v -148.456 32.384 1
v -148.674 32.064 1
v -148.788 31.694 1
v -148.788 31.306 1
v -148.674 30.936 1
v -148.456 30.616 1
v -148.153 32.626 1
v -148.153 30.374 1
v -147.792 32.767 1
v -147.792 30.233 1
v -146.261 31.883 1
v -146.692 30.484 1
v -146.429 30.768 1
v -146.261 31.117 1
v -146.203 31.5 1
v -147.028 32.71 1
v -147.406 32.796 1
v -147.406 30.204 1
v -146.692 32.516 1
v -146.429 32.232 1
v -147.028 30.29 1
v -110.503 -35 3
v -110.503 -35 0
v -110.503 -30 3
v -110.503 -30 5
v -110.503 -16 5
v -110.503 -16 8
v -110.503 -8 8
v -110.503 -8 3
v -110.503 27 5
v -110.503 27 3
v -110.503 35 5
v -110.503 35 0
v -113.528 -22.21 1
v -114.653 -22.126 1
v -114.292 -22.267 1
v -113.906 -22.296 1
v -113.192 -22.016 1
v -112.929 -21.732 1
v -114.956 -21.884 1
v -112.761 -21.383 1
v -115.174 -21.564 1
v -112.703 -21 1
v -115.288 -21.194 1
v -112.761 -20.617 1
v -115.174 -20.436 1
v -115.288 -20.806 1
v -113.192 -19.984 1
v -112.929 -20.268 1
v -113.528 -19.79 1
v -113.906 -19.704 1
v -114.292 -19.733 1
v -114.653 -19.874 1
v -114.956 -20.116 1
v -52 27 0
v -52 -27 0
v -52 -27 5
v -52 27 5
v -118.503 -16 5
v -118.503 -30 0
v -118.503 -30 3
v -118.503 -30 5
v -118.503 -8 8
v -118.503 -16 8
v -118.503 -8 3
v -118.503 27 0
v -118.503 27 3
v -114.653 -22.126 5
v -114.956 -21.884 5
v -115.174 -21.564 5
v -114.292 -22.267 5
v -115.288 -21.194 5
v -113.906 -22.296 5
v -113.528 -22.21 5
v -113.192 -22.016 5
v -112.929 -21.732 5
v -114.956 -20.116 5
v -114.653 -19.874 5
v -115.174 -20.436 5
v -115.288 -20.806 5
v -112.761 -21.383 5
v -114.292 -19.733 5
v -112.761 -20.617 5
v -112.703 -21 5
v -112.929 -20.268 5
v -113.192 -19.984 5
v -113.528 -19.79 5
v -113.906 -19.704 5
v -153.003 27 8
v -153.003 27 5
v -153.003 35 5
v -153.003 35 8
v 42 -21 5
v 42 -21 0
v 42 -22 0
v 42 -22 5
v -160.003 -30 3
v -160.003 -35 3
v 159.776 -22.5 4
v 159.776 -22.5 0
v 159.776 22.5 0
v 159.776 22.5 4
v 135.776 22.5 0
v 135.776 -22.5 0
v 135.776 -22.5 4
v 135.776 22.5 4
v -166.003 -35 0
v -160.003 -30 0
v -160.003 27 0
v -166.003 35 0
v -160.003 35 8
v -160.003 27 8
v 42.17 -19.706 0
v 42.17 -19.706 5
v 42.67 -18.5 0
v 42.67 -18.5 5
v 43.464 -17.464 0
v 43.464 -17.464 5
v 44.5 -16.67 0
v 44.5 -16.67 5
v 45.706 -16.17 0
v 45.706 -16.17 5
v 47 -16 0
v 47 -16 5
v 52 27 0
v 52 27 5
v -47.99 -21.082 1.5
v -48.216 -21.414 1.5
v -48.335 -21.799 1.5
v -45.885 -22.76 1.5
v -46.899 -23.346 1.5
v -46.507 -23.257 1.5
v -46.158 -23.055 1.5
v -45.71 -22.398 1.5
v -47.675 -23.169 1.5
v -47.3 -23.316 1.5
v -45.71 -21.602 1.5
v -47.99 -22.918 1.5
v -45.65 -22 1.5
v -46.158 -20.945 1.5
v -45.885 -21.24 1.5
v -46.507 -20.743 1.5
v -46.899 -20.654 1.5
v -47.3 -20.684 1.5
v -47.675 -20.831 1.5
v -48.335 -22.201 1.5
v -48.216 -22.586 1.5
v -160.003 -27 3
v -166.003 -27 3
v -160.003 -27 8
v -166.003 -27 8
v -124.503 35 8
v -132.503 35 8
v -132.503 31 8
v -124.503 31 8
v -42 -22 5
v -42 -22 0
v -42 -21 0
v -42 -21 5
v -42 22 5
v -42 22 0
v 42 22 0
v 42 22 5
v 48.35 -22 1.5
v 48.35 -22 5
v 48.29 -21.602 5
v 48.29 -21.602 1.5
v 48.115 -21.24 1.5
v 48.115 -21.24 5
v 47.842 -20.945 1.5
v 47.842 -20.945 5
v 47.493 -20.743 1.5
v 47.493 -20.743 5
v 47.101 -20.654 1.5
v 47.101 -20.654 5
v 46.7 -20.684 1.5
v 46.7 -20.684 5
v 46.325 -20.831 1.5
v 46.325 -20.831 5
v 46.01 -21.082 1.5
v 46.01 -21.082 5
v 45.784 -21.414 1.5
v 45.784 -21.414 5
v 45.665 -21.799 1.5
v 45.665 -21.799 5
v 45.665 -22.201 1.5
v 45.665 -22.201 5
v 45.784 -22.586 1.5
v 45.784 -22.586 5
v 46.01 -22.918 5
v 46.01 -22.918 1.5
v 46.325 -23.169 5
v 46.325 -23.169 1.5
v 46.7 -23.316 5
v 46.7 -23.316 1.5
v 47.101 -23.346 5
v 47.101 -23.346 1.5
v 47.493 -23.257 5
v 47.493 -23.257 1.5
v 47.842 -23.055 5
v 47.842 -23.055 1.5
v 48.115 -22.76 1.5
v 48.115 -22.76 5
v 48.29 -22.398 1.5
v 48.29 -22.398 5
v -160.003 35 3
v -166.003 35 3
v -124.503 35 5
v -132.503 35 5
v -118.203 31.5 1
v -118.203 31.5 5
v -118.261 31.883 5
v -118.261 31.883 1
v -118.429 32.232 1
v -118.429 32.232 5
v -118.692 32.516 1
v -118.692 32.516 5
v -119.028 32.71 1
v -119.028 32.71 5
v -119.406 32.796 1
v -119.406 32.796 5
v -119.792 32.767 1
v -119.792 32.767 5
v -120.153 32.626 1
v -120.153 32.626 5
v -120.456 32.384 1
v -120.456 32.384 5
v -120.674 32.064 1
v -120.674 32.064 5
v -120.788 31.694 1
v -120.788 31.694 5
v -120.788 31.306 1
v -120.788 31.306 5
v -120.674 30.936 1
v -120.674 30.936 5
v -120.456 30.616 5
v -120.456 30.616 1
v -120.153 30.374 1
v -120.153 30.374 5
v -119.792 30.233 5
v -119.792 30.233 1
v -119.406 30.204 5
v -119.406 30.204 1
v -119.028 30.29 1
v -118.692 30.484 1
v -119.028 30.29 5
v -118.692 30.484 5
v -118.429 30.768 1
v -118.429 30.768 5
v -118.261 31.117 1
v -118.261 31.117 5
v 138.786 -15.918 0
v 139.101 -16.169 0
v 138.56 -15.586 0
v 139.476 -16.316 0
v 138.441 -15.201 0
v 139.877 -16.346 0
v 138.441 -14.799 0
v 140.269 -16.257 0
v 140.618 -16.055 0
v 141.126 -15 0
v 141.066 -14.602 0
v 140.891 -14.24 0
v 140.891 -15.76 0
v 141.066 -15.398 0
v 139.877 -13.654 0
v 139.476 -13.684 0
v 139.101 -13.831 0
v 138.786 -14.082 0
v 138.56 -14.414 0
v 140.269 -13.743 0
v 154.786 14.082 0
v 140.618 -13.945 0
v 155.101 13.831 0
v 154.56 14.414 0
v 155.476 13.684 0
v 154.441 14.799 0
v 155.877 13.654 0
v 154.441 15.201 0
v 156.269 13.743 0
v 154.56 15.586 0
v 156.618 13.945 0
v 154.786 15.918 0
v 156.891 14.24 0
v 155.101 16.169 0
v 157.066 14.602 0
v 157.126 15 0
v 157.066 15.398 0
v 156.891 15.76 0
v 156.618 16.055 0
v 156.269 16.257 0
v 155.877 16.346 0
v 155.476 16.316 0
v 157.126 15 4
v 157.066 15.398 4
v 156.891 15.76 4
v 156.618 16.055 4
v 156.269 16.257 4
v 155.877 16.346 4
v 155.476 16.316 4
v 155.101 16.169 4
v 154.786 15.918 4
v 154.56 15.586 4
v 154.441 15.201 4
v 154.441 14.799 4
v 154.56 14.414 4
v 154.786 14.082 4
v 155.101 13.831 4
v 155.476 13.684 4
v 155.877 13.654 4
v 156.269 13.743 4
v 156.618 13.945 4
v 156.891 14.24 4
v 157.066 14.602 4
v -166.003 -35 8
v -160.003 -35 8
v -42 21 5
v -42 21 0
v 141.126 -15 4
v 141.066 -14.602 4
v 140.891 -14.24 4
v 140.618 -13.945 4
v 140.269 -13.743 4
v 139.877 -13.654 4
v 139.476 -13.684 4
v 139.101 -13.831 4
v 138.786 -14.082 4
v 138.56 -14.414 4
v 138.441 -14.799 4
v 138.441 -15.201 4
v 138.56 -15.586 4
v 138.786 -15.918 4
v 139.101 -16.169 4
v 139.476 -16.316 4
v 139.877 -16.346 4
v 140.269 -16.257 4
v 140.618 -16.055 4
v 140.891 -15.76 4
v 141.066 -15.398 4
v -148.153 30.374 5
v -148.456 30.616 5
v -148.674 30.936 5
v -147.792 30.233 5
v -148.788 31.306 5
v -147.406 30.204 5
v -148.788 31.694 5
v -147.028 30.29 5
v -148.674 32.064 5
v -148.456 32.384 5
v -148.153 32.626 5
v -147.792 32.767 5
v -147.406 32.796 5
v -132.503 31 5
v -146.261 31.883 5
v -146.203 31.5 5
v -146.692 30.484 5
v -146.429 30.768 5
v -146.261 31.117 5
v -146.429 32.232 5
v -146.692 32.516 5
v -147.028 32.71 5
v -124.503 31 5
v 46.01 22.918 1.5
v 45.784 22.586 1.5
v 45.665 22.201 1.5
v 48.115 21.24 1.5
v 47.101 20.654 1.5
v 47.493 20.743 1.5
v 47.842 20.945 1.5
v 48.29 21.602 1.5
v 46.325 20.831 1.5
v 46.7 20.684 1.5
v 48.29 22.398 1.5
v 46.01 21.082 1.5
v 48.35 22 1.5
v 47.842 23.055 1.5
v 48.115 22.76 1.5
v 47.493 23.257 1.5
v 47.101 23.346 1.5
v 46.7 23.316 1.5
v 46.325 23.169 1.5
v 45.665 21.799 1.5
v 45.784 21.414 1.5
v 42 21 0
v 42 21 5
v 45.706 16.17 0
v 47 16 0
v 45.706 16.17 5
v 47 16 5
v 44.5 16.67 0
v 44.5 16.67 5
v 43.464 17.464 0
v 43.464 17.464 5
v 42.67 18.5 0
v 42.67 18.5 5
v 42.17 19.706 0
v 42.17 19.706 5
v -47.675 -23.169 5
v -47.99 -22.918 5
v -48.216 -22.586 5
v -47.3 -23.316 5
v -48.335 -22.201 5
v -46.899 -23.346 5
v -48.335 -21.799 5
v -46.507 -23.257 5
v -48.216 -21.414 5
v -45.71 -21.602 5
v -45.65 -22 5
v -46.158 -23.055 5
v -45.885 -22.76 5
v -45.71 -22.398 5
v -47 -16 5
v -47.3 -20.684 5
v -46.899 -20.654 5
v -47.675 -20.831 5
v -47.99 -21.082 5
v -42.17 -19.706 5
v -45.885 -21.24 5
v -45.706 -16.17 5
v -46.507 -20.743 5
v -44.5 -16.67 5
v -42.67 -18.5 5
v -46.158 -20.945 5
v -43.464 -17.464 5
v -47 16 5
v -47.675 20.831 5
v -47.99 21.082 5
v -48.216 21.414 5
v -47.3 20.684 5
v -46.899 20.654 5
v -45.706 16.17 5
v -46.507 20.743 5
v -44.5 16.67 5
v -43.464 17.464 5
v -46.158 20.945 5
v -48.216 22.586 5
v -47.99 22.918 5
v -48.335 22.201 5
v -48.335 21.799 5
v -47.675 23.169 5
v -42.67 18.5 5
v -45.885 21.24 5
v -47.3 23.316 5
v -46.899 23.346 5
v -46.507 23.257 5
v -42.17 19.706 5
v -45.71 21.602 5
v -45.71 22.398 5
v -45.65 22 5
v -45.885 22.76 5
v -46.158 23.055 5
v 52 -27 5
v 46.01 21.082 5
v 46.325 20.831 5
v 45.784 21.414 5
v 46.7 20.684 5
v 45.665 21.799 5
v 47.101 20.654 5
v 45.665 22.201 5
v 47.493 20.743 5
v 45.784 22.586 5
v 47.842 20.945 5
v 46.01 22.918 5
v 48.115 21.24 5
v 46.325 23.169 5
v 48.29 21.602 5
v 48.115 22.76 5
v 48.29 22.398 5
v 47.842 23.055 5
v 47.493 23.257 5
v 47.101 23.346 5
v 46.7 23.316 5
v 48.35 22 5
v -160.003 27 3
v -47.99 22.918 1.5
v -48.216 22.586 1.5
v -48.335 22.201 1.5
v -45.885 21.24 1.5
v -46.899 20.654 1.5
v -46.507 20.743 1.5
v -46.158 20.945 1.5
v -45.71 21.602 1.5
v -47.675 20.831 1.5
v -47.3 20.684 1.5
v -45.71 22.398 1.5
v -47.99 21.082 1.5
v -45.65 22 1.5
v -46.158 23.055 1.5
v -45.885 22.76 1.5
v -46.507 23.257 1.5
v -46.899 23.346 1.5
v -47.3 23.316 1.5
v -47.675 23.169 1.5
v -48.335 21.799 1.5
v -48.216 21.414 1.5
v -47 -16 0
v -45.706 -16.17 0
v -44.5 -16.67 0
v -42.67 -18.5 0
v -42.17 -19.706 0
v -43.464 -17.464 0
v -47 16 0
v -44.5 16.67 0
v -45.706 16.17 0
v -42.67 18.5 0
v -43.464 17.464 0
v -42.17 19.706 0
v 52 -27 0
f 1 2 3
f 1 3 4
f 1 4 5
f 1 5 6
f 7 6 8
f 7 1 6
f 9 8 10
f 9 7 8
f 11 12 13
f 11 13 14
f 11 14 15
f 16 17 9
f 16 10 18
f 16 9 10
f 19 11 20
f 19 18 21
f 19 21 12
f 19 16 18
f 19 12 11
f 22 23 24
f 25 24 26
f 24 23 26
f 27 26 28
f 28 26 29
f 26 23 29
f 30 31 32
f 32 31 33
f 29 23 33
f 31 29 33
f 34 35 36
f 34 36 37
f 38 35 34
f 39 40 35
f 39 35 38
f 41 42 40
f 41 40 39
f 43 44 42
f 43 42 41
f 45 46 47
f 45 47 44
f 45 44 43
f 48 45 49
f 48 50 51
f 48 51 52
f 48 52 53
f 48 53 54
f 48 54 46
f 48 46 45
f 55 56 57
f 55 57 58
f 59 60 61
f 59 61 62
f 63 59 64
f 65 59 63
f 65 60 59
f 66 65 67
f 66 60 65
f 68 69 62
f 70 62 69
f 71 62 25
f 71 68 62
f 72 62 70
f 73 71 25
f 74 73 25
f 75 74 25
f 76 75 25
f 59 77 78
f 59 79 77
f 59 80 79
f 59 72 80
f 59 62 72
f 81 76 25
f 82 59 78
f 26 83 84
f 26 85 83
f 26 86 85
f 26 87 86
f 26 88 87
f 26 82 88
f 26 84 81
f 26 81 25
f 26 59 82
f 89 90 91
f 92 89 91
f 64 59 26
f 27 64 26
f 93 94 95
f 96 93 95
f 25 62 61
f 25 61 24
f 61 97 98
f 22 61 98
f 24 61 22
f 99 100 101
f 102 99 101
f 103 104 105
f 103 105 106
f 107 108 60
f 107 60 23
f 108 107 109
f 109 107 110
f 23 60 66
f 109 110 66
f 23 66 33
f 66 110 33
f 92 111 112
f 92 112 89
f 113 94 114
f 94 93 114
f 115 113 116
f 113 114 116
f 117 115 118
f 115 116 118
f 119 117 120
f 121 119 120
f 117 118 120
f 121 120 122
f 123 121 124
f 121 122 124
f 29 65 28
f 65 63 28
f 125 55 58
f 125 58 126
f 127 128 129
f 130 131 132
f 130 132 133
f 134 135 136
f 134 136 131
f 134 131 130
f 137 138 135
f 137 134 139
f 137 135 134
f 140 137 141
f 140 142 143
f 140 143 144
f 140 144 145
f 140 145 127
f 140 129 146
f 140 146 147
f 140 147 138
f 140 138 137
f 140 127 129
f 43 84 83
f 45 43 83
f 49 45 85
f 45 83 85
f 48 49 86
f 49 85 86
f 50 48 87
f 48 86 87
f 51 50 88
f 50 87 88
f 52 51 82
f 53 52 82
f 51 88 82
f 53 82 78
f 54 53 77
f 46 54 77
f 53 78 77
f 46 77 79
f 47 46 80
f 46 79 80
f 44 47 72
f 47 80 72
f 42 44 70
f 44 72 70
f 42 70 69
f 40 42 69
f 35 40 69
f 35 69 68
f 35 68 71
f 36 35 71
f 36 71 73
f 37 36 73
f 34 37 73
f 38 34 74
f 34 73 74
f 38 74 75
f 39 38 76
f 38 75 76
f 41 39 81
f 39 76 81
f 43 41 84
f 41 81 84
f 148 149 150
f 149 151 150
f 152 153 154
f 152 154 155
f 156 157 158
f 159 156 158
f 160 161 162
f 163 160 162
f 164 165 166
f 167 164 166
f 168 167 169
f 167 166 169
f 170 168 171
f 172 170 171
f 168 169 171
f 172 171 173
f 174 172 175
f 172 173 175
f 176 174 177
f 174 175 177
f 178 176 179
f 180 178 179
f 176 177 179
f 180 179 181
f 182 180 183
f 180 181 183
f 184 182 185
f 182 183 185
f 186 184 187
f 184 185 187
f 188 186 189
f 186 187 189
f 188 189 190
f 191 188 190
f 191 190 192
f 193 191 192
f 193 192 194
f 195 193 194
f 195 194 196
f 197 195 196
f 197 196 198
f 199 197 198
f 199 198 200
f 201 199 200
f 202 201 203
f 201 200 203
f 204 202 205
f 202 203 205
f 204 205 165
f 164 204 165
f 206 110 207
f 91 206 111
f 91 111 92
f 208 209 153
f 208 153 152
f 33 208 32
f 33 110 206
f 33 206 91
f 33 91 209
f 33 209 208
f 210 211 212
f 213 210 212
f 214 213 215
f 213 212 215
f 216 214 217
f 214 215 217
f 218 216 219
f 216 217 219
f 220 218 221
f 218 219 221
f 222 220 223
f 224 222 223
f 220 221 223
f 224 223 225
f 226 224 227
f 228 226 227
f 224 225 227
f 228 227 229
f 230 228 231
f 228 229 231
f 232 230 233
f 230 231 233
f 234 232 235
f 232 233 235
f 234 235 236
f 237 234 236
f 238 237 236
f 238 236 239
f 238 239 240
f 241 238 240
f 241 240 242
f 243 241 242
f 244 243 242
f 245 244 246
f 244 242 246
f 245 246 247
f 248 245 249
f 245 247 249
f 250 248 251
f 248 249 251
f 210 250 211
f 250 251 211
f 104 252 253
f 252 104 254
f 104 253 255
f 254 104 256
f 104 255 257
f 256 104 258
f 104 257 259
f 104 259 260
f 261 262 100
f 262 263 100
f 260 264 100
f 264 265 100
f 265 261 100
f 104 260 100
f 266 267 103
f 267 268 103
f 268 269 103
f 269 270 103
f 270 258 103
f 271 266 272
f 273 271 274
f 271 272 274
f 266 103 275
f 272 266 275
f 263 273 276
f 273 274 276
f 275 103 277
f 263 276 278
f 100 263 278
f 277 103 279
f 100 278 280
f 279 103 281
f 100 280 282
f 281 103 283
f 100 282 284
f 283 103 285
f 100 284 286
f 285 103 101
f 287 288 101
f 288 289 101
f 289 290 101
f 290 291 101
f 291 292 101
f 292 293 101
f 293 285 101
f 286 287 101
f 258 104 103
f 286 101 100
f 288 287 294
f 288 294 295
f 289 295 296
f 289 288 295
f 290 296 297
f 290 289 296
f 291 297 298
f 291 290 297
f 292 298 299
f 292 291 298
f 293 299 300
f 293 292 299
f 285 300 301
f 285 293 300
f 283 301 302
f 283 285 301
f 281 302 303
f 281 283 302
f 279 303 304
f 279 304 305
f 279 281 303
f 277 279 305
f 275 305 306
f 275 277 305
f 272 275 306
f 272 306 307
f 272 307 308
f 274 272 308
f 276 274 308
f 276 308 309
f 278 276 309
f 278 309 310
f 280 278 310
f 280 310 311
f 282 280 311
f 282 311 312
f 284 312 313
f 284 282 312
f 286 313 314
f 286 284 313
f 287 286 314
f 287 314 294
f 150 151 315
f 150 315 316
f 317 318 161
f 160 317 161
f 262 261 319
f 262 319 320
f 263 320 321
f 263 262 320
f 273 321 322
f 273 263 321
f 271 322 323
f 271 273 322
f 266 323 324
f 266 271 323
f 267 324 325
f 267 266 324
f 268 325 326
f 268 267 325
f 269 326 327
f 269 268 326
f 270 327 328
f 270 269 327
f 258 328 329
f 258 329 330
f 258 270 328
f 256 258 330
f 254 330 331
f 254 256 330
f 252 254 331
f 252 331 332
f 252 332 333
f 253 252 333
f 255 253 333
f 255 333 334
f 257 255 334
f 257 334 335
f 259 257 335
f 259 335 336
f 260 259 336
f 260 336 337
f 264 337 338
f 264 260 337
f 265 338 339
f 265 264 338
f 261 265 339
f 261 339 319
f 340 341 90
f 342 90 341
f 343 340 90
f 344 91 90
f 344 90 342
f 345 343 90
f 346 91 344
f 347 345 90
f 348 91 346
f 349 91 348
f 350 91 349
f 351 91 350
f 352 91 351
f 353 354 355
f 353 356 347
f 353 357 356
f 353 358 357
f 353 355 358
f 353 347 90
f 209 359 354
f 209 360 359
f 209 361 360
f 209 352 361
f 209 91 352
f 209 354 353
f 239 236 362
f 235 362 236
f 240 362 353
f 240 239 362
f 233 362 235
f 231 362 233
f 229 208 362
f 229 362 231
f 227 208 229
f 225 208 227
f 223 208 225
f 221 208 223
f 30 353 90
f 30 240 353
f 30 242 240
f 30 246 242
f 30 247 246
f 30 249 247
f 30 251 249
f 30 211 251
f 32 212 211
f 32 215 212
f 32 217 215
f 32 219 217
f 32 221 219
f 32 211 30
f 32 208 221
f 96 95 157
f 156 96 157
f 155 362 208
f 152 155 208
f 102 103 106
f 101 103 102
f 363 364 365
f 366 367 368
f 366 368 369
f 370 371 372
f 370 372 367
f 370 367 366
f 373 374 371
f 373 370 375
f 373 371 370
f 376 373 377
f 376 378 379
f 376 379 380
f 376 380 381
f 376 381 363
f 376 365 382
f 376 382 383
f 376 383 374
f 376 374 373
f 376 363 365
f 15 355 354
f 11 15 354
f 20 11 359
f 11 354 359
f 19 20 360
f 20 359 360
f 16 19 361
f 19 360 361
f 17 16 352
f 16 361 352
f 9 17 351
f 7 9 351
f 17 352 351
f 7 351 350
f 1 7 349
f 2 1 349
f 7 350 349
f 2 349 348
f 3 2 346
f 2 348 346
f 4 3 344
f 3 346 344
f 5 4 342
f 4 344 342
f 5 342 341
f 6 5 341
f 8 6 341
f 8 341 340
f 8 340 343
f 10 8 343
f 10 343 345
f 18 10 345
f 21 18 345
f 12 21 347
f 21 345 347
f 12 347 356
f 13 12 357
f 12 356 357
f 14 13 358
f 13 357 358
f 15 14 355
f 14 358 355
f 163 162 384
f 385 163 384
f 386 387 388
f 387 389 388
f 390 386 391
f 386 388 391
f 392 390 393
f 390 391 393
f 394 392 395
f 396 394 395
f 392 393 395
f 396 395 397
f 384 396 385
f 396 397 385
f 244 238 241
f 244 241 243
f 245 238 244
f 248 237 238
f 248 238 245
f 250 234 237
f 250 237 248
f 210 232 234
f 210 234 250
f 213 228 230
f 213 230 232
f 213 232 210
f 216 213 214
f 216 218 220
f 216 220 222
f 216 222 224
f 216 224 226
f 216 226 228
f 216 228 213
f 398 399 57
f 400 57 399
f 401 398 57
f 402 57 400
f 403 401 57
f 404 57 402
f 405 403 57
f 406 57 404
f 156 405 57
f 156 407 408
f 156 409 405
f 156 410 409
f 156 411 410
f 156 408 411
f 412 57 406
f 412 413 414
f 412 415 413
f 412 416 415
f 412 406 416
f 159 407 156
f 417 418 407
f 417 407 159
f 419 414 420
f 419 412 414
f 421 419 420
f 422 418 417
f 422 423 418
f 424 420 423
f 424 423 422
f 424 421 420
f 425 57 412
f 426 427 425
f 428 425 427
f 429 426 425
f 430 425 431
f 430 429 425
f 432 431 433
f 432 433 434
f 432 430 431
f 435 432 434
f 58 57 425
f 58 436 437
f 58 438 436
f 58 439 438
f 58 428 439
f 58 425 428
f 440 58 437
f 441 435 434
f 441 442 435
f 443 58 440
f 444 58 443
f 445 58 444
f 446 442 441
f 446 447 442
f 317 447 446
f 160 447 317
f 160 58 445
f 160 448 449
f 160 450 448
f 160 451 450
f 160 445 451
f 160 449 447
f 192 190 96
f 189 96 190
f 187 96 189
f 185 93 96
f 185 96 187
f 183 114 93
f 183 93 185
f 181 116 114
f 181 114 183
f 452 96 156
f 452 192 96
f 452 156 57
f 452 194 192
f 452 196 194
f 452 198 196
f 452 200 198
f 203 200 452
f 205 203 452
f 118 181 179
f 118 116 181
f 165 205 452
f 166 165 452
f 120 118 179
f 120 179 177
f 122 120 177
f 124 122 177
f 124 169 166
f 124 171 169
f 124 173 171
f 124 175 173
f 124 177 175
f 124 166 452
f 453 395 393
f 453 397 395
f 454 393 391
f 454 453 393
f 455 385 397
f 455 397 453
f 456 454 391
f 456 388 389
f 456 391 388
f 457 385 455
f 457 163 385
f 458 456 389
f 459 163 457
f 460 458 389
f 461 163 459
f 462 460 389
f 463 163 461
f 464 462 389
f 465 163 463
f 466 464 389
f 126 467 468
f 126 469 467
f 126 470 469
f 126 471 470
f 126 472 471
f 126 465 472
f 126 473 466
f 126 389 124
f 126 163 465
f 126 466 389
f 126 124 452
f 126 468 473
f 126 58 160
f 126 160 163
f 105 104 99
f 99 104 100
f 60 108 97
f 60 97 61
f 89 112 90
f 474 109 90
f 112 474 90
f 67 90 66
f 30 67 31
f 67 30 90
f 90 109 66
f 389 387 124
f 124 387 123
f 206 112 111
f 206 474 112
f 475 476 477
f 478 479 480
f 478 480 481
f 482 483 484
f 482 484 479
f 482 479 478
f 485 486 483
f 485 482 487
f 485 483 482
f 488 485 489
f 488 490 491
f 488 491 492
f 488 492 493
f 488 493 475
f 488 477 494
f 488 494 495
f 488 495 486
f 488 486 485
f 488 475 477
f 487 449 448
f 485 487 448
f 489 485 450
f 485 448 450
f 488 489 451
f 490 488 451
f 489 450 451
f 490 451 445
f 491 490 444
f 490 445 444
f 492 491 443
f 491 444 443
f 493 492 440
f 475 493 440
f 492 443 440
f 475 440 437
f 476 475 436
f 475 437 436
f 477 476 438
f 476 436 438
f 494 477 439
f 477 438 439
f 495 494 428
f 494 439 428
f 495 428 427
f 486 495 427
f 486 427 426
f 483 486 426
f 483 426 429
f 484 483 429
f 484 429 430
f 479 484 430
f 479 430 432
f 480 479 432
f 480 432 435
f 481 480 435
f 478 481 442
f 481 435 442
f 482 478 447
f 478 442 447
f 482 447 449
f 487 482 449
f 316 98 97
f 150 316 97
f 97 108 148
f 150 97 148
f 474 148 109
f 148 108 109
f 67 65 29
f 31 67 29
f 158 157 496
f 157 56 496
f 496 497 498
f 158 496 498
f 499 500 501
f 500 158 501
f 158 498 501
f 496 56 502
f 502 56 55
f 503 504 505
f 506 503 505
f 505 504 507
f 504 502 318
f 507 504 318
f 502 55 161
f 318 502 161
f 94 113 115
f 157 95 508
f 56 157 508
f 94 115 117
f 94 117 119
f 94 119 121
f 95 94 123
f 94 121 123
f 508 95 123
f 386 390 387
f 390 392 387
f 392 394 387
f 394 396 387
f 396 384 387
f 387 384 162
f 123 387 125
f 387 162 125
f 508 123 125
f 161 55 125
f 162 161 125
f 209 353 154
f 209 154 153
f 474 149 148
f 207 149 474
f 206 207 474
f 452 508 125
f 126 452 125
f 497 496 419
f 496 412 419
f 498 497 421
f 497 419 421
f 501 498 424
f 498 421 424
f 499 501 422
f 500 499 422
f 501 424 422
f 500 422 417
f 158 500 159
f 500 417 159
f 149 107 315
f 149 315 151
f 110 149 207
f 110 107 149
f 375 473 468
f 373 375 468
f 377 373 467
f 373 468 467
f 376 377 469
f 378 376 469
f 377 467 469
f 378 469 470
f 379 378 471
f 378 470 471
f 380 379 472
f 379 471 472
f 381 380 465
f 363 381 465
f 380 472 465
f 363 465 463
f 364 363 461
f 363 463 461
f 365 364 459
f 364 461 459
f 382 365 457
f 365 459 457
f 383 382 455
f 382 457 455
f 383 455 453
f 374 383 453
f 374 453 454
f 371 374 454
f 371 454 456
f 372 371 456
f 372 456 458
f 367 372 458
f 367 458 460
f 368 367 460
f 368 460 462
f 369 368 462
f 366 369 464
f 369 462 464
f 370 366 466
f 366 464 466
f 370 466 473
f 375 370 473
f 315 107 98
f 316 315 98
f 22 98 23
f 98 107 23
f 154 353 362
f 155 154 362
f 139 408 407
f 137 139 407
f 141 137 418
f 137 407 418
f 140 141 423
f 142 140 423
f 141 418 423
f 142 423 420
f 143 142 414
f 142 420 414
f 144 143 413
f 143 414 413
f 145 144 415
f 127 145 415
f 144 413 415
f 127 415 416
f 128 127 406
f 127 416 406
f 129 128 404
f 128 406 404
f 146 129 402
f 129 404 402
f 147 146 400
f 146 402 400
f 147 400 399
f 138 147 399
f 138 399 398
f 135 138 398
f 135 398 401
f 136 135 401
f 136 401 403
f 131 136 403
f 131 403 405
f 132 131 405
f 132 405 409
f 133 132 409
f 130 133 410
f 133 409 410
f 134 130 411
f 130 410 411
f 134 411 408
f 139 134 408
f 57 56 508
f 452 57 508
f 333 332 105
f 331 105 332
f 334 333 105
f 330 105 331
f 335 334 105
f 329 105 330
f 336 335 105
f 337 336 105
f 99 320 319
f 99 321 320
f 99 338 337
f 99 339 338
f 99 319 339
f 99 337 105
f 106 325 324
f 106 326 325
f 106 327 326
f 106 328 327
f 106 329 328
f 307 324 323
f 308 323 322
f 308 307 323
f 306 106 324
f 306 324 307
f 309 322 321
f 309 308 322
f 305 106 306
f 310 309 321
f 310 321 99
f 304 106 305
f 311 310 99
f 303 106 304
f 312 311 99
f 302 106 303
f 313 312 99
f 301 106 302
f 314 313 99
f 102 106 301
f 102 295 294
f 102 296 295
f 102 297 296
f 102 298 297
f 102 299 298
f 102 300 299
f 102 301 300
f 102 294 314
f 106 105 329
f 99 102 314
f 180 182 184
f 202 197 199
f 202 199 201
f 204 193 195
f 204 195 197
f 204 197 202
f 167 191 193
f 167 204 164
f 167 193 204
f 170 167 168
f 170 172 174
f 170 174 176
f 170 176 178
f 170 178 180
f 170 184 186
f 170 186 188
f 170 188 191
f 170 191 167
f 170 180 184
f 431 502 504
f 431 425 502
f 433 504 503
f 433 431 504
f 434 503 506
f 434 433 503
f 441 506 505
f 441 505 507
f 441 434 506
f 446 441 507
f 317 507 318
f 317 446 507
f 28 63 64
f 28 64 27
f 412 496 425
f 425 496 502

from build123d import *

# Parameters (mm, degrees)
F0_W      = 104
F0_H      = 54
F1_DEPTH  = 5
F2_R      = 1.35
F3_DEPTH  = 3.5
F4_R      = 4.99999
F5_W      = 24
F5_H      = 45
F5_R      = 1.35
F6_DEPTH  = 4
F7_W      = 55.5
F7_H      = 70
F7_W_2    = 41.5
F7_H_2    = 57
F8_DEPTH  = 5
F9_W      = 7
F9_H      = 8
F9_W_2    = 8
F9_H_2    = 4
F9_W_3    = 6
F10_DEPTH = 3
F12_W     = 6
F12_H     = 62
F12_W_2   = 49.5
F12_H_2   = 5
F12_W_3   = 8
F12_H_3   = 35
F13_DEPTH = 2
F14_R     = 1.3
F15_DEPTH = 4


# Not quite as in the source:
# - a fillet or chamfer is up to 0.001 mm smaller than in the source, because OpenCascade refuses the exact size


with BuildPart() as f1:
    # F0 (on Top) → F1 (new body)
    with BuildSketch(Plane.XY):
        Rectangle(F0_W, F0_H)
        Polygon((-42, 16), (-42, 22), (42, 22), (42, 16), (47, 16), (47, -16), (42, -16), (42, -22), (-42, -22), (-42, -16), (-47, -16), (-47, 16), align=None, mode=Mode.SUBTRACT)
    extrude(amount=F1_DEPTH)

    # F2 (on face) → F3 (cut)
    with BuildSketch(Plane.XY.offset(5)):
        with Locations((-47, 22)):
            Circle(F2_R)
        with Locations((47, 22)):
            Circle(F2_R)
        with Locations((-47, -22)):
            Circle(F2_R)
        with Locations((47, -22)):
            Circle(F2_R)
    extrude(amount=-F3_DEPTH, mode=Mode.SUBTRACT)

    # F4 (radius 5 in the source; OpenCascade refuses exactly that, so slightly less here)
    f4_edges = [f1.edges().sort_by_distance(p)[0] for p in [
        (-42, 16, 2.5),
        (-42, -16, 2.5),
        (42, 16, 2.5),
        (42, -16, 2.5),
    ]]
    fillet(f4_edges, radius=F4_R)


with BuildPart() as f6:
    # F5 (on Top) → F6 (new body)
    with BuildSketch(Plane.XY):
        with Locations((147.7760076523, 0)):
            Rectangle(F5_W, F5_H)
        with Locations((139.7760076523, -15)):
            Circle(F5_R, mode=Mode.SUBTRACT)
        with Locations((155.7760076523, 15)):
            Circle(F5_R, mode=Mode.SUBTRACT)
    extrude(amount=F6_DEPTH)


with BuildPart() as f8:
    # F7 (on Top) → F8 (new body)
    with BuildSketch(Plane.XY):
        with Locations((-138.2528990507, 0)):
            Rectangle(F7_W, F7_H)
        with Locations((-139.2528990507, -1.5)):
            Rectangle(F7_W_2, F7_H_2, mode=Mode.SUBTRACT)
    extrude(amount=F8_DEPTH)

    # F9 (on face) → F10 (join)
    with BuildSketch(Plane.XY.offset(5)):
        with Locations((-156.5028990507, 31)):
            Rectangle(F9_W, F9_H)
        with Locations((-128.5028990507, 33)):
            Rectangle(F9_W_2, F9_H_2)
        with Locations((-114.5028990507, -12)):
            Rectangle(F9_W_2, F9_H)
        with Locations((-163.0028990507, -31)):
            Rectangle(F9_W_3, F9_H)
    extrude(amount=F10_DEPTH)

    # F12 (on offset) → F13 (cut)
    with BuildSketch(Plane.XY.offset(5)):
        with Locations((-163.0028990507, 4)):
            Rectangle(F12_W, F12_H)
        with Locations((-135.2528990507, -32.5)):
            Rectangle(F12_W_2, F12_H_2)
        with Locations((-114.5028990507, 9.5)):
            Rectangle(F12_W_3, F12_H_3)
    extrude(amount=-F13_DEPTH, mode=Mode.SUBTRACT)

    # F14 (on face) → F15 (cut)
    with BuildSketch(Plane.XY.offset(5)):
        with Locations((-147.5028990507, 31.5)):
            Circle(F14_R)
        with Locations((-119.5028990507, 31.5)):
            Circle(F14_R)
        with Locations((-114.0028990507, -21)):
            Circle(F14_R)
    extrude(amount=-F15_DEPTH, mode=Mode.SUBTRACT)


solid = Compound([f1.part, f6.part, f8.part])
